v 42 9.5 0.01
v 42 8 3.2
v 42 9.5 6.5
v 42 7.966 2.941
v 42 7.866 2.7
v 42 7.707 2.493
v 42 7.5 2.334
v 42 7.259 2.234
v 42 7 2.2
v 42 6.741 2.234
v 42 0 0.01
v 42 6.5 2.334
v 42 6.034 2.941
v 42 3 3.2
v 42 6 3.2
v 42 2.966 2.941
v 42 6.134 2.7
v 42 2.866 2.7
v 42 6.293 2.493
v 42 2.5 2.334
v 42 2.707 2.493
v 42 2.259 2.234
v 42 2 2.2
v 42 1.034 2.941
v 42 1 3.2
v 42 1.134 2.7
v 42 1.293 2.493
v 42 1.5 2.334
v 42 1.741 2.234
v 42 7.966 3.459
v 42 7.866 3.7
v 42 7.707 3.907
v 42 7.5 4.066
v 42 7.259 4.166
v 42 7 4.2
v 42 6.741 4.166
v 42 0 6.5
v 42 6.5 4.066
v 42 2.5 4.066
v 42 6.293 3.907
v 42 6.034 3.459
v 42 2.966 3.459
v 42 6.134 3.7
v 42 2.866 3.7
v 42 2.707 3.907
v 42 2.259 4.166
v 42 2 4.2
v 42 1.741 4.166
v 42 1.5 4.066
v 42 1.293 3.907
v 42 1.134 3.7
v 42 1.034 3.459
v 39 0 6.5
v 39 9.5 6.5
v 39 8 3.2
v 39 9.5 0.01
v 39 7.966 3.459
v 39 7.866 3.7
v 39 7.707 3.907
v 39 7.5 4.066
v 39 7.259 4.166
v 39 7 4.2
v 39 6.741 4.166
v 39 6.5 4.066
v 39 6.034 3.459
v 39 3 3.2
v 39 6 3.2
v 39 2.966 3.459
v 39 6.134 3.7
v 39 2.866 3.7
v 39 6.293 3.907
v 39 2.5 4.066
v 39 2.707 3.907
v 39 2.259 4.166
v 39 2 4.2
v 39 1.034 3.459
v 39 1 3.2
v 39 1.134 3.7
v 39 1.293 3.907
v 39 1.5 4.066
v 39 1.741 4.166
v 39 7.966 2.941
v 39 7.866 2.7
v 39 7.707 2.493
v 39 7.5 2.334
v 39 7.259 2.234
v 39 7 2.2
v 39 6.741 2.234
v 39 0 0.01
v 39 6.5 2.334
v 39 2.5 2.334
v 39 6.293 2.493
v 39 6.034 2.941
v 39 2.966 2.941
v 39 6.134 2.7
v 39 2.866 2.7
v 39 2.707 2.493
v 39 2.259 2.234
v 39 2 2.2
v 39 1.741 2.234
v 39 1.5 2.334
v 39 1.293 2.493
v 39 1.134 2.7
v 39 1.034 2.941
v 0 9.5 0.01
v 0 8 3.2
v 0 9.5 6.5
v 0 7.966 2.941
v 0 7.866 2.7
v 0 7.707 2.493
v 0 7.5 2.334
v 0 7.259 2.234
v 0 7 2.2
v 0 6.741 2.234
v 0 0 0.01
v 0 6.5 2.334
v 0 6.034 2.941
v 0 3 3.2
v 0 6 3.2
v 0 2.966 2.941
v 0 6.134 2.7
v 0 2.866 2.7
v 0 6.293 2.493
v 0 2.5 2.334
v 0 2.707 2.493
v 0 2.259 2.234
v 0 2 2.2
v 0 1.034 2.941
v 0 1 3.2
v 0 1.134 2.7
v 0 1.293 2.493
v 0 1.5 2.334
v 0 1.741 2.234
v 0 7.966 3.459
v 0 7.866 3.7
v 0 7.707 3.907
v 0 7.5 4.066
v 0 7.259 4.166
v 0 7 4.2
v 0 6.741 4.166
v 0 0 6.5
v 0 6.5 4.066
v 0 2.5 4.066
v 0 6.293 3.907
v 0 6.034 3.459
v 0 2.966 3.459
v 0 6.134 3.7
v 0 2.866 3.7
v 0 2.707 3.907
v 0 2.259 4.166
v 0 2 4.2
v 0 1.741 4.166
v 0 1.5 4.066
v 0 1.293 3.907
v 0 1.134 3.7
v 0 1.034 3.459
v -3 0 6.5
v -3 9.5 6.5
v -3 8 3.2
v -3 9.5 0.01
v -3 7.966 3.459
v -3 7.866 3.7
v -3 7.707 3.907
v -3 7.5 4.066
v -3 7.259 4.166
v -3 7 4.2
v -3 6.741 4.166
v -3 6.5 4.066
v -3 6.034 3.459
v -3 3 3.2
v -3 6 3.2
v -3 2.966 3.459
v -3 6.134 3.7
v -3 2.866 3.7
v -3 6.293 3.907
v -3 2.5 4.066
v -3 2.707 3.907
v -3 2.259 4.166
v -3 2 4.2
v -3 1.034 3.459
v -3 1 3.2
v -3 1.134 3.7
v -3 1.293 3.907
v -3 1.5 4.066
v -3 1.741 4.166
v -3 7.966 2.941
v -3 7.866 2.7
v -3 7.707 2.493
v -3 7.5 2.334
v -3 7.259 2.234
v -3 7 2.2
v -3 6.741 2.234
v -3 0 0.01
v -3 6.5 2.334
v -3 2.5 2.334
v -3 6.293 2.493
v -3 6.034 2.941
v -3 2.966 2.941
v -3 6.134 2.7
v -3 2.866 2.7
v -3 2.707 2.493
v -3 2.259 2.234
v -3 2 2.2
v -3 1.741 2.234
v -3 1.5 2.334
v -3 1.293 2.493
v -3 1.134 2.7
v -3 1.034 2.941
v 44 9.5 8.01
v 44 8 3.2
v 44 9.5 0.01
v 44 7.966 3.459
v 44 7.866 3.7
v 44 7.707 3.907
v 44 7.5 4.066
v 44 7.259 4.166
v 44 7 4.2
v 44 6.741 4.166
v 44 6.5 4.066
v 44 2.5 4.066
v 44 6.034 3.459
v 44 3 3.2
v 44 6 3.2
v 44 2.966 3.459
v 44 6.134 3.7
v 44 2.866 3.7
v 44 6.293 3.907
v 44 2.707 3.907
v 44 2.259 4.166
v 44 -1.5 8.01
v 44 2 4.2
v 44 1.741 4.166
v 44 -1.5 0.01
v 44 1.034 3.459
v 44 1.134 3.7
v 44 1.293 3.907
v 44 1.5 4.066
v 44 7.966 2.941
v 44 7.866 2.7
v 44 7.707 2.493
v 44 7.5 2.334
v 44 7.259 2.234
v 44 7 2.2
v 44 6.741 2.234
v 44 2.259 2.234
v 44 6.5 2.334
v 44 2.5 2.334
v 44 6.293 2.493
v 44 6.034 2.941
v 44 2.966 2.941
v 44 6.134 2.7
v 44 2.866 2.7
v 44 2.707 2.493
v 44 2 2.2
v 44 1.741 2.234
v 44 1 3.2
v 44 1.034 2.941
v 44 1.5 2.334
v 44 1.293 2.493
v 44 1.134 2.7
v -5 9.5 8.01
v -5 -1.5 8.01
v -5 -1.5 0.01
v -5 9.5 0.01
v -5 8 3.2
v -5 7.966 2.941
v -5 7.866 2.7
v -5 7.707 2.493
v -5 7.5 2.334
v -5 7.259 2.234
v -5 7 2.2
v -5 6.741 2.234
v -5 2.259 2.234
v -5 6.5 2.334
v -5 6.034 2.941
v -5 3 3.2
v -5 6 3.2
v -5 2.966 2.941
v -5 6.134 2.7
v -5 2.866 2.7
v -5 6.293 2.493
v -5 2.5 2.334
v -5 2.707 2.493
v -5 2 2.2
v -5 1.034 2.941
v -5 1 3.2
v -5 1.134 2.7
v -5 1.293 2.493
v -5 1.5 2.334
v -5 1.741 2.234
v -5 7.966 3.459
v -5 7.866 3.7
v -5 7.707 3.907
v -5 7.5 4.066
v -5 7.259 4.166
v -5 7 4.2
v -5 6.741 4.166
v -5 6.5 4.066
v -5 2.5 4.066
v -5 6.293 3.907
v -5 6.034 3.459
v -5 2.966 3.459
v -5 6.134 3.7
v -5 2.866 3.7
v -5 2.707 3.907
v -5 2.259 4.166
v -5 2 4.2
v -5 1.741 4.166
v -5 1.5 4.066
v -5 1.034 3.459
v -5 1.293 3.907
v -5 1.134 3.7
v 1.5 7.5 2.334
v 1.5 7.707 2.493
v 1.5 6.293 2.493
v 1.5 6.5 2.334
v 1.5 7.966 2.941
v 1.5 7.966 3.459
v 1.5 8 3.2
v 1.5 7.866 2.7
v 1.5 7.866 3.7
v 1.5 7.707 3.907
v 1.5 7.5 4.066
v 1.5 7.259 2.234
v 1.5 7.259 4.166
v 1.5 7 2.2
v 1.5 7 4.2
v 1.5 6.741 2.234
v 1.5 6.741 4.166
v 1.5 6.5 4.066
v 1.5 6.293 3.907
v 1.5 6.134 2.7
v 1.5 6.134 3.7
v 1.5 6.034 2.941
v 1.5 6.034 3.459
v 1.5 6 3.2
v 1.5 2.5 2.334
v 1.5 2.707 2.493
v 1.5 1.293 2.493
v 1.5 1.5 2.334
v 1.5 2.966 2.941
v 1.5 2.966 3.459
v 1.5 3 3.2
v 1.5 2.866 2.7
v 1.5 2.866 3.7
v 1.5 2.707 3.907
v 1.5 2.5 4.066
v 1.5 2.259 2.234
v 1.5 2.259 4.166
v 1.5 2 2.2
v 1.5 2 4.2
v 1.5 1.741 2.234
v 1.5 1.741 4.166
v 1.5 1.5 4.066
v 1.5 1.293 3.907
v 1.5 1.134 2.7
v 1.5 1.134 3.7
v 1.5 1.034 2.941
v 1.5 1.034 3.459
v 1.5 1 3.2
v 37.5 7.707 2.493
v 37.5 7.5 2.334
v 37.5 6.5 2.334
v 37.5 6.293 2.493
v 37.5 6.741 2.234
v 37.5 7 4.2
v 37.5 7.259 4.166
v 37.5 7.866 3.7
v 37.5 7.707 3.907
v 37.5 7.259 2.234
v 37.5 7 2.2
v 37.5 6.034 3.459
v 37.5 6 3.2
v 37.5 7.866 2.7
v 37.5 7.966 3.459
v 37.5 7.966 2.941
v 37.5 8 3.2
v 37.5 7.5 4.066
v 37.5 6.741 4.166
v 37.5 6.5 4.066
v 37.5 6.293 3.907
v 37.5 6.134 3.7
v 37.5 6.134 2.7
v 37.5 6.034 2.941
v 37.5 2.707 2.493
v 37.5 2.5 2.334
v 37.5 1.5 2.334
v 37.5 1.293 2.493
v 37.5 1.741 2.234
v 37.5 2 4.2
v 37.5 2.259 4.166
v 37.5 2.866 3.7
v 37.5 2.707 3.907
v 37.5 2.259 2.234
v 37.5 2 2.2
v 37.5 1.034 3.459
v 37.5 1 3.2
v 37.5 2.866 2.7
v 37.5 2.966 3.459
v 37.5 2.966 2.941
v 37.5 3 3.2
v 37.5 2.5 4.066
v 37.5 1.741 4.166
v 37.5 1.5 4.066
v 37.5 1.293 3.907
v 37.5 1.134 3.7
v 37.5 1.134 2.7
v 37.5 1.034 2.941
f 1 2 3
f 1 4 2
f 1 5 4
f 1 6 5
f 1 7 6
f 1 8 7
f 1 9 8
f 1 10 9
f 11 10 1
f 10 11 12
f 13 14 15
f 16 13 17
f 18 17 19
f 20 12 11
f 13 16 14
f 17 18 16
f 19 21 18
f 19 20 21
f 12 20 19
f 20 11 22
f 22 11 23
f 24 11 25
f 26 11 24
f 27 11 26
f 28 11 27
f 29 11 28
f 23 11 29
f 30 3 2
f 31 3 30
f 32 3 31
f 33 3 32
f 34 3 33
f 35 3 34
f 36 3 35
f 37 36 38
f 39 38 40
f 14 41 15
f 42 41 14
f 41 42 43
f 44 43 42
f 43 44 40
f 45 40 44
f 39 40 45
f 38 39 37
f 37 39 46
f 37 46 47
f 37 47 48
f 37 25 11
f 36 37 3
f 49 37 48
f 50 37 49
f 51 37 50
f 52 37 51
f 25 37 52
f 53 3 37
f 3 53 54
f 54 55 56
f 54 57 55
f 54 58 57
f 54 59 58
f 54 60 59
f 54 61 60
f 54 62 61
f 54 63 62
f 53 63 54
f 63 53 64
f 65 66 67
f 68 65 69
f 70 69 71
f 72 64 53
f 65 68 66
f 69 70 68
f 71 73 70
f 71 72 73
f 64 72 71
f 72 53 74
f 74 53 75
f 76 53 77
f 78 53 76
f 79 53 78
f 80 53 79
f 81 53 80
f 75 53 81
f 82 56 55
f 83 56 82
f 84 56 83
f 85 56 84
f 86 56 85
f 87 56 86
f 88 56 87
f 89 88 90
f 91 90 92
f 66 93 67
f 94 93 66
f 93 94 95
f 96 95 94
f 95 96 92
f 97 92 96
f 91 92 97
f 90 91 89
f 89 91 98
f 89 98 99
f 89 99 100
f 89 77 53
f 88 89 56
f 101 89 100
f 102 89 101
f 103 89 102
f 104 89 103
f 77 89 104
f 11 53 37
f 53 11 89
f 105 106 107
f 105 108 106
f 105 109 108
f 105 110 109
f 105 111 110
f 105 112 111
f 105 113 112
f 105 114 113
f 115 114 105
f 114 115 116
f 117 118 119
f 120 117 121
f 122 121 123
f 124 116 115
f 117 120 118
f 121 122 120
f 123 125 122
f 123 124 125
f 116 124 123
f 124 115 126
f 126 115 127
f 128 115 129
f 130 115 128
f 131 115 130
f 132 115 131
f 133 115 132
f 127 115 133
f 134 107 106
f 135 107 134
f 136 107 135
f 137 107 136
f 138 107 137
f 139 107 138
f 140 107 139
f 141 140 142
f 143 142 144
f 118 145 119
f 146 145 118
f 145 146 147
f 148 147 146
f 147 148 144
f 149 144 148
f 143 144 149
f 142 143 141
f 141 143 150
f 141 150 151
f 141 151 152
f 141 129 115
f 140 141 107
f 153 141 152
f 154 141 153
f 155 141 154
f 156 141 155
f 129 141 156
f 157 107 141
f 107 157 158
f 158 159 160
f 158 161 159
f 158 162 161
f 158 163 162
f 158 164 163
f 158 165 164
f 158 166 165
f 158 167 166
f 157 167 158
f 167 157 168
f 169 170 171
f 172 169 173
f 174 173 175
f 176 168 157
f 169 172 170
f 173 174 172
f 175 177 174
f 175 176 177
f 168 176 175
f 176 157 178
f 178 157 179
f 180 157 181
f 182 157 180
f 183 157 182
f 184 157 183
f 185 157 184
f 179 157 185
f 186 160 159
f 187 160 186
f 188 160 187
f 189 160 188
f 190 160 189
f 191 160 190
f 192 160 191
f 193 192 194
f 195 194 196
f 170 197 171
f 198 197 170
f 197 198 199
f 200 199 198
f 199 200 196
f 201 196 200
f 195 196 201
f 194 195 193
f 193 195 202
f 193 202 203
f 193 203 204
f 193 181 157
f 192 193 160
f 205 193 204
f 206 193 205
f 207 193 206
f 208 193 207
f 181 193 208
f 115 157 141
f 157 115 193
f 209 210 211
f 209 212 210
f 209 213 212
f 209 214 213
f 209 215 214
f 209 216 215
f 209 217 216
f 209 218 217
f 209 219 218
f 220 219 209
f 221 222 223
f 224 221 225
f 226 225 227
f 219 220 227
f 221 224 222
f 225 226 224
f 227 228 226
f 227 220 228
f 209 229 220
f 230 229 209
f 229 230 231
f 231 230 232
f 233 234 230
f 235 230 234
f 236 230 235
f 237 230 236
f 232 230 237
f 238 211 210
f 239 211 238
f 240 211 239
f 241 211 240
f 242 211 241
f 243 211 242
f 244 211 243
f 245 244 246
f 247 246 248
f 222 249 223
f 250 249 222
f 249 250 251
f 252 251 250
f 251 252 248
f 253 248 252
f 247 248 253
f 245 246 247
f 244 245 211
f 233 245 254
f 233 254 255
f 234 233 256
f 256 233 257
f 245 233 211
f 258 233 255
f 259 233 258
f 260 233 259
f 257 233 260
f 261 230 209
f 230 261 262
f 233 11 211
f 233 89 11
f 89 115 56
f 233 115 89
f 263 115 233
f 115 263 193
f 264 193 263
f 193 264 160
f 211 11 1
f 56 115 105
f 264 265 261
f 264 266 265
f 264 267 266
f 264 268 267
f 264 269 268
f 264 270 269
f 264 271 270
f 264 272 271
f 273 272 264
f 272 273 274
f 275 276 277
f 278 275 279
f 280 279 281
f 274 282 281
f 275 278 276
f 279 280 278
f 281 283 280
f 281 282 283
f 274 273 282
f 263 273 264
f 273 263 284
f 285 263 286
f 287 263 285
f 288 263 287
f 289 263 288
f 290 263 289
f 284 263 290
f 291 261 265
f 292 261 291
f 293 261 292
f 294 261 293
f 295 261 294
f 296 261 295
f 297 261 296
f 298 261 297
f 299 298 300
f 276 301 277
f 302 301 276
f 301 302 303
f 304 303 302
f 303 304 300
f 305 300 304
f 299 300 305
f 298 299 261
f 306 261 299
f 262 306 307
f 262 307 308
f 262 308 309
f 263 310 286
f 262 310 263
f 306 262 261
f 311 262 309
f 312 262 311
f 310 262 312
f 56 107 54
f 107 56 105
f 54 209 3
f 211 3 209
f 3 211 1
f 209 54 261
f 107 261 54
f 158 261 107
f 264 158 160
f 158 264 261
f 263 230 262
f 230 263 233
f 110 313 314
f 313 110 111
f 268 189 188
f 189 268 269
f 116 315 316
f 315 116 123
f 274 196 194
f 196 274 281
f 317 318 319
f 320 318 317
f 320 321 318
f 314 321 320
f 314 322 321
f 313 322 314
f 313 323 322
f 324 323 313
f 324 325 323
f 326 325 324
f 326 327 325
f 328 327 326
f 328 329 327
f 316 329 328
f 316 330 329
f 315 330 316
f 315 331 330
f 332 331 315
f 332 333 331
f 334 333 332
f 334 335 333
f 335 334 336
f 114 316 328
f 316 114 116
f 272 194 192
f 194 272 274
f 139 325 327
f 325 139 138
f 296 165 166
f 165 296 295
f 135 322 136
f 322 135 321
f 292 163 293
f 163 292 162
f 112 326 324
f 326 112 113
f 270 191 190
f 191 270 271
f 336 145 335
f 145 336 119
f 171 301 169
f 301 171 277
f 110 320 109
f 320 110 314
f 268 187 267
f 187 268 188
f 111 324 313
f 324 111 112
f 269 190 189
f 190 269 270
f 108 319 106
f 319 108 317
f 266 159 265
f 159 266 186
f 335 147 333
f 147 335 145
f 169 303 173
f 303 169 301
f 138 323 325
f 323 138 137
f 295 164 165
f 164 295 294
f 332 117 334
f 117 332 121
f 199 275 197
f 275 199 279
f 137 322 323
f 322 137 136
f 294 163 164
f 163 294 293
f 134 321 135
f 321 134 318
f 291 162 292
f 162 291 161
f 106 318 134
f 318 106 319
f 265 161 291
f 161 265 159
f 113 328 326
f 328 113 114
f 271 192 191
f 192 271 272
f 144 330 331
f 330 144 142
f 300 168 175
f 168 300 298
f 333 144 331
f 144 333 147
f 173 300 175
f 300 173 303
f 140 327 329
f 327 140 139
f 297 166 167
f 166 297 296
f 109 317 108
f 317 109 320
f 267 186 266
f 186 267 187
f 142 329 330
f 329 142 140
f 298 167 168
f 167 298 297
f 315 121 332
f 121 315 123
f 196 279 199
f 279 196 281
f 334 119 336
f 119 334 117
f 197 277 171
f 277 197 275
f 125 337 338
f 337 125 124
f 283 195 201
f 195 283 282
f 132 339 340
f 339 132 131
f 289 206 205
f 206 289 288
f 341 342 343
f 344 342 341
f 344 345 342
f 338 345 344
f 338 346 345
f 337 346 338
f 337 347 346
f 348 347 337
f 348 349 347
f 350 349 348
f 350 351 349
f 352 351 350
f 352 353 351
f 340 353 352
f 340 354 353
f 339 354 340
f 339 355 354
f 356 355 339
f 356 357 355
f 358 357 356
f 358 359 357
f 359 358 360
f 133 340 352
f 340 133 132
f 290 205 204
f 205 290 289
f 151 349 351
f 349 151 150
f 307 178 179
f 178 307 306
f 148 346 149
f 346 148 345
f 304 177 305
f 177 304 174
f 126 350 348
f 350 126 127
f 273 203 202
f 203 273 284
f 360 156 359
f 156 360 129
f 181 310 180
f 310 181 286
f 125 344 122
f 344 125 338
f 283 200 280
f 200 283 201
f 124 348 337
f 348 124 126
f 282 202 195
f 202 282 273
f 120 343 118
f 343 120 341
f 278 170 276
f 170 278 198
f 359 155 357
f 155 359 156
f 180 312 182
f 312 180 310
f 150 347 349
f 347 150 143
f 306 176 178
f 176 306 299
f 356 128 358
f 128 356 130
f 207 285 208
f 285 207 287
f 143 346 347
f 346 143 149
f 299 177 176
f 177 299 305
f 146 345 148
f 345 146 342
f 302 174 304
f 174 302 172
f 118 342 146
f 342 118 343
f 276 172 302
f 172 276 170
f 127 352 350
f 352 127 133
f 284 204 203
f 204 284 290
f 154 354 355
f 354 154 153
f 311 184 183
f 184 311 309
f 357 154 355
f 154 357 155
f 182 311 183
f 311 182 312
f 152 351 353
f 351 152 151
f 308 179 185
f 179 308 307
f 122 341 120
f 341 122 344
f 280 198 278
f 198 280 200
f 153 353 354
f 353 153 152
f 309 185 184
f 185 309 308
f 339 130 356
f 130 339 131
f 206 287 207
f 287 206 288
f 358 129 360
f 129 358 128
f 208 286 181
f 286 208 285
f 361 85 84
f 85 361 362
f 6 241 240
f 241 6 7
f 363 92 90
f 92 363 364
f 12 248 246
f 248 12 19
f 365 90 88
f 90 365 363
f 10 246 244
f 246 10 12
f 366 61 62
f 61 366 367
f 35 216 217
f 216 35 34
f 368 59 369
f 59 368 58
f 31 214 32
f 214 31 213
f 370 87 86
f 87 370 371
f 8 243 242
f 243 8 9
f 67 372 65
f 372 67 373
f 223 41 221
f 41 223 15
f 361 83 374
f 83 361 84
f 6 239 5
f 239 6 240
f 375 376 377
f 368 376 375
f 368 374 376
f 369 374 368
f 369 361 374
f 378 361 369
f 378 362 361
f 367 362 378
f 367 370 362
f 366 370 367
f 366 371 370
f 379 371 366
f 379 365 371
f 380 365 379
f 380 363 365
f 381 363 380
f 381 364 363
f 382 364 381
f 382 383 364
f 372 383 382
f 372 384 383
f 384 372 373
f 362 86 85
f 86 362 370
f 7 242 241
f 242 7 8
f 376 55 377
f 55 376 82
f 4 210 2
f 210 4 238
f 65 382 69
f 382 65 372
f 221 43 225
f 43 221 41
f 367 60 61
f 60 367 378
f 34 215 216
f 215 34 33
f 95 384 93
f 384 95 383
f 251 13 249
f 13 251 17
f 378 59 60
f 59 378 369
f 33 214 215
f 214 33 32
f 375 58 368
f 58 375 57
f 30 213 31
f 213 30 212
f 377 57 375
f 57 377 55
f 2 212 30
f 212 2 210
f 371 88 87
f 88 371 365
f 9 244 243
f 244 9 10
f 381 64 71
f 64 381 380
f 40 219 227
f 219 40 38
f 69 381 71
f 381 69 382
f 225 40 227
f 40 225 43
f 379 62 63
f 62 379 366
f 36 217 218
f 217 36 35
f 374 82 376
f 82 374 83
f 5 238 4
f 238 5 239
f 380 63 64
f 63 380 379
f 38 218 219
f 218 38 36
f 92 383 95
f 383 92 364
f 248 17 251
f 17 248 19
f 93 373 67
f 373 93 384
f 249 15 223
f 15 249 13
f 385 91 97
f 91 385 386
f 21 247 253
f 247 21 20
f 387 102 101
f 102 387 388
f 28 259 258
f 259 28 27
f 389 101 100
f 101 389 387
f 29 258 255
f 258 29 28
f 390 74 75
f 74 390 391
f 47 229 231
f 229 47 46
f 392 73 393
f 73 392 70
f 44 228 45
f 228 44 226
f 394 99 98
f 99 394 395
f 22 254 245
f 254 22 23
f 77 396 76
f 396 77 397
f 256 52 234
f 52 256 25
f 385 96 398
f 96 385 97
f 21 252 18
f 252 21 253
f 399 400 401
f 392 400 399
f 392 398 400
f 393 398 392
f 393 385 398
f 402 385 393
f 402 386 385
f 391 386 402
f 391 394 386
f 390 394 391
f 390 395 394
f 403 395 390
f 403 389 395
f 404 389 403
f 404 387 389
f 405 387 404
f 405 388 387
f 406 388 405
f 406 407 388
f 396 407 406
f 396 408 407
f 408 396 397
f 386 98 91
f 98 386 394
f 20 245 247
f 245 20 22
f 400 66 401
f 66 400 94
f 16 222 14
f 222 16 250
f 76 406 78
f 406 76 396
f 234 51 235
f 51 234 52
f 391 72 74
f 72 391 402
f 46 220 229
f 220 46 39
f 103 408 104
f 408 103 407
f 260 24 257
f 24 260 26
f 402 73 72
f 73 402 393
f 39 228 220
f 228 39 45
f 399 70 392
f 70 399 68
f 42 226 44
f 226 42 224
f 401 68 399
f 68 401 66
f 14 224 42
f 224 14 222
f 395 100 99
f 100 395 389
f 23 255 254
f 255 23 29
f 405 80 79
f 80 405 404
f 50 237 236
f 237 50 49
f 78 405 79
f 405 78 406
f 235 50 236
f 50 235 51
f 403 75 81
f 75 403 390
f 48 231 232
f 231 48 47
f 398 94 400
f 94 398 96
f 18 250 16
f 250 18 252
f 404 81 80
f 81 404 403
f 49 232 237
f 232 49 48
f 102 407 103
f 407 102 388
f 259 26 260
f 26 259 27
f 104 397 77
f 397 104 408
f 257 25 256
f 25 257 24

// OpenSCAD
/*Rail is:
6.4 tall
3 thick
*/
module rail_end() {
   cube([3,12,6.5]); //rail
/*
  translate([-.5,2,3.2]) //hole 1
  rotate([0,90,0])
  cylinder(d=2, h=4, $fn=24);

  translate([-.5,7,3.2]) //hole 2
  rotate([0,90,0])
  cylinder(d=2, h=4, $fn=24);
*/
}

module pin() {
  rotate([0,90,0])
  cylinder(d=2, h=7, $fn=24);
}

module chassis() {
translate([39,0,0]) //left_rail
  rail_end(); 
translate([-3,0,0]) //right_rail
  rail_end(); 
}

difference() {
//Bumper
translate([-5,-1.5,.01]) cube([49,11,8]);

//pins
translate([-5.5,7,3.2])
  pin();
translate([-5.5,2,3.2])
  pin();
translate([37.5,7,3.2])
  pin();
translate([37.5,2,3.2])
  pin();

chassis();
}
